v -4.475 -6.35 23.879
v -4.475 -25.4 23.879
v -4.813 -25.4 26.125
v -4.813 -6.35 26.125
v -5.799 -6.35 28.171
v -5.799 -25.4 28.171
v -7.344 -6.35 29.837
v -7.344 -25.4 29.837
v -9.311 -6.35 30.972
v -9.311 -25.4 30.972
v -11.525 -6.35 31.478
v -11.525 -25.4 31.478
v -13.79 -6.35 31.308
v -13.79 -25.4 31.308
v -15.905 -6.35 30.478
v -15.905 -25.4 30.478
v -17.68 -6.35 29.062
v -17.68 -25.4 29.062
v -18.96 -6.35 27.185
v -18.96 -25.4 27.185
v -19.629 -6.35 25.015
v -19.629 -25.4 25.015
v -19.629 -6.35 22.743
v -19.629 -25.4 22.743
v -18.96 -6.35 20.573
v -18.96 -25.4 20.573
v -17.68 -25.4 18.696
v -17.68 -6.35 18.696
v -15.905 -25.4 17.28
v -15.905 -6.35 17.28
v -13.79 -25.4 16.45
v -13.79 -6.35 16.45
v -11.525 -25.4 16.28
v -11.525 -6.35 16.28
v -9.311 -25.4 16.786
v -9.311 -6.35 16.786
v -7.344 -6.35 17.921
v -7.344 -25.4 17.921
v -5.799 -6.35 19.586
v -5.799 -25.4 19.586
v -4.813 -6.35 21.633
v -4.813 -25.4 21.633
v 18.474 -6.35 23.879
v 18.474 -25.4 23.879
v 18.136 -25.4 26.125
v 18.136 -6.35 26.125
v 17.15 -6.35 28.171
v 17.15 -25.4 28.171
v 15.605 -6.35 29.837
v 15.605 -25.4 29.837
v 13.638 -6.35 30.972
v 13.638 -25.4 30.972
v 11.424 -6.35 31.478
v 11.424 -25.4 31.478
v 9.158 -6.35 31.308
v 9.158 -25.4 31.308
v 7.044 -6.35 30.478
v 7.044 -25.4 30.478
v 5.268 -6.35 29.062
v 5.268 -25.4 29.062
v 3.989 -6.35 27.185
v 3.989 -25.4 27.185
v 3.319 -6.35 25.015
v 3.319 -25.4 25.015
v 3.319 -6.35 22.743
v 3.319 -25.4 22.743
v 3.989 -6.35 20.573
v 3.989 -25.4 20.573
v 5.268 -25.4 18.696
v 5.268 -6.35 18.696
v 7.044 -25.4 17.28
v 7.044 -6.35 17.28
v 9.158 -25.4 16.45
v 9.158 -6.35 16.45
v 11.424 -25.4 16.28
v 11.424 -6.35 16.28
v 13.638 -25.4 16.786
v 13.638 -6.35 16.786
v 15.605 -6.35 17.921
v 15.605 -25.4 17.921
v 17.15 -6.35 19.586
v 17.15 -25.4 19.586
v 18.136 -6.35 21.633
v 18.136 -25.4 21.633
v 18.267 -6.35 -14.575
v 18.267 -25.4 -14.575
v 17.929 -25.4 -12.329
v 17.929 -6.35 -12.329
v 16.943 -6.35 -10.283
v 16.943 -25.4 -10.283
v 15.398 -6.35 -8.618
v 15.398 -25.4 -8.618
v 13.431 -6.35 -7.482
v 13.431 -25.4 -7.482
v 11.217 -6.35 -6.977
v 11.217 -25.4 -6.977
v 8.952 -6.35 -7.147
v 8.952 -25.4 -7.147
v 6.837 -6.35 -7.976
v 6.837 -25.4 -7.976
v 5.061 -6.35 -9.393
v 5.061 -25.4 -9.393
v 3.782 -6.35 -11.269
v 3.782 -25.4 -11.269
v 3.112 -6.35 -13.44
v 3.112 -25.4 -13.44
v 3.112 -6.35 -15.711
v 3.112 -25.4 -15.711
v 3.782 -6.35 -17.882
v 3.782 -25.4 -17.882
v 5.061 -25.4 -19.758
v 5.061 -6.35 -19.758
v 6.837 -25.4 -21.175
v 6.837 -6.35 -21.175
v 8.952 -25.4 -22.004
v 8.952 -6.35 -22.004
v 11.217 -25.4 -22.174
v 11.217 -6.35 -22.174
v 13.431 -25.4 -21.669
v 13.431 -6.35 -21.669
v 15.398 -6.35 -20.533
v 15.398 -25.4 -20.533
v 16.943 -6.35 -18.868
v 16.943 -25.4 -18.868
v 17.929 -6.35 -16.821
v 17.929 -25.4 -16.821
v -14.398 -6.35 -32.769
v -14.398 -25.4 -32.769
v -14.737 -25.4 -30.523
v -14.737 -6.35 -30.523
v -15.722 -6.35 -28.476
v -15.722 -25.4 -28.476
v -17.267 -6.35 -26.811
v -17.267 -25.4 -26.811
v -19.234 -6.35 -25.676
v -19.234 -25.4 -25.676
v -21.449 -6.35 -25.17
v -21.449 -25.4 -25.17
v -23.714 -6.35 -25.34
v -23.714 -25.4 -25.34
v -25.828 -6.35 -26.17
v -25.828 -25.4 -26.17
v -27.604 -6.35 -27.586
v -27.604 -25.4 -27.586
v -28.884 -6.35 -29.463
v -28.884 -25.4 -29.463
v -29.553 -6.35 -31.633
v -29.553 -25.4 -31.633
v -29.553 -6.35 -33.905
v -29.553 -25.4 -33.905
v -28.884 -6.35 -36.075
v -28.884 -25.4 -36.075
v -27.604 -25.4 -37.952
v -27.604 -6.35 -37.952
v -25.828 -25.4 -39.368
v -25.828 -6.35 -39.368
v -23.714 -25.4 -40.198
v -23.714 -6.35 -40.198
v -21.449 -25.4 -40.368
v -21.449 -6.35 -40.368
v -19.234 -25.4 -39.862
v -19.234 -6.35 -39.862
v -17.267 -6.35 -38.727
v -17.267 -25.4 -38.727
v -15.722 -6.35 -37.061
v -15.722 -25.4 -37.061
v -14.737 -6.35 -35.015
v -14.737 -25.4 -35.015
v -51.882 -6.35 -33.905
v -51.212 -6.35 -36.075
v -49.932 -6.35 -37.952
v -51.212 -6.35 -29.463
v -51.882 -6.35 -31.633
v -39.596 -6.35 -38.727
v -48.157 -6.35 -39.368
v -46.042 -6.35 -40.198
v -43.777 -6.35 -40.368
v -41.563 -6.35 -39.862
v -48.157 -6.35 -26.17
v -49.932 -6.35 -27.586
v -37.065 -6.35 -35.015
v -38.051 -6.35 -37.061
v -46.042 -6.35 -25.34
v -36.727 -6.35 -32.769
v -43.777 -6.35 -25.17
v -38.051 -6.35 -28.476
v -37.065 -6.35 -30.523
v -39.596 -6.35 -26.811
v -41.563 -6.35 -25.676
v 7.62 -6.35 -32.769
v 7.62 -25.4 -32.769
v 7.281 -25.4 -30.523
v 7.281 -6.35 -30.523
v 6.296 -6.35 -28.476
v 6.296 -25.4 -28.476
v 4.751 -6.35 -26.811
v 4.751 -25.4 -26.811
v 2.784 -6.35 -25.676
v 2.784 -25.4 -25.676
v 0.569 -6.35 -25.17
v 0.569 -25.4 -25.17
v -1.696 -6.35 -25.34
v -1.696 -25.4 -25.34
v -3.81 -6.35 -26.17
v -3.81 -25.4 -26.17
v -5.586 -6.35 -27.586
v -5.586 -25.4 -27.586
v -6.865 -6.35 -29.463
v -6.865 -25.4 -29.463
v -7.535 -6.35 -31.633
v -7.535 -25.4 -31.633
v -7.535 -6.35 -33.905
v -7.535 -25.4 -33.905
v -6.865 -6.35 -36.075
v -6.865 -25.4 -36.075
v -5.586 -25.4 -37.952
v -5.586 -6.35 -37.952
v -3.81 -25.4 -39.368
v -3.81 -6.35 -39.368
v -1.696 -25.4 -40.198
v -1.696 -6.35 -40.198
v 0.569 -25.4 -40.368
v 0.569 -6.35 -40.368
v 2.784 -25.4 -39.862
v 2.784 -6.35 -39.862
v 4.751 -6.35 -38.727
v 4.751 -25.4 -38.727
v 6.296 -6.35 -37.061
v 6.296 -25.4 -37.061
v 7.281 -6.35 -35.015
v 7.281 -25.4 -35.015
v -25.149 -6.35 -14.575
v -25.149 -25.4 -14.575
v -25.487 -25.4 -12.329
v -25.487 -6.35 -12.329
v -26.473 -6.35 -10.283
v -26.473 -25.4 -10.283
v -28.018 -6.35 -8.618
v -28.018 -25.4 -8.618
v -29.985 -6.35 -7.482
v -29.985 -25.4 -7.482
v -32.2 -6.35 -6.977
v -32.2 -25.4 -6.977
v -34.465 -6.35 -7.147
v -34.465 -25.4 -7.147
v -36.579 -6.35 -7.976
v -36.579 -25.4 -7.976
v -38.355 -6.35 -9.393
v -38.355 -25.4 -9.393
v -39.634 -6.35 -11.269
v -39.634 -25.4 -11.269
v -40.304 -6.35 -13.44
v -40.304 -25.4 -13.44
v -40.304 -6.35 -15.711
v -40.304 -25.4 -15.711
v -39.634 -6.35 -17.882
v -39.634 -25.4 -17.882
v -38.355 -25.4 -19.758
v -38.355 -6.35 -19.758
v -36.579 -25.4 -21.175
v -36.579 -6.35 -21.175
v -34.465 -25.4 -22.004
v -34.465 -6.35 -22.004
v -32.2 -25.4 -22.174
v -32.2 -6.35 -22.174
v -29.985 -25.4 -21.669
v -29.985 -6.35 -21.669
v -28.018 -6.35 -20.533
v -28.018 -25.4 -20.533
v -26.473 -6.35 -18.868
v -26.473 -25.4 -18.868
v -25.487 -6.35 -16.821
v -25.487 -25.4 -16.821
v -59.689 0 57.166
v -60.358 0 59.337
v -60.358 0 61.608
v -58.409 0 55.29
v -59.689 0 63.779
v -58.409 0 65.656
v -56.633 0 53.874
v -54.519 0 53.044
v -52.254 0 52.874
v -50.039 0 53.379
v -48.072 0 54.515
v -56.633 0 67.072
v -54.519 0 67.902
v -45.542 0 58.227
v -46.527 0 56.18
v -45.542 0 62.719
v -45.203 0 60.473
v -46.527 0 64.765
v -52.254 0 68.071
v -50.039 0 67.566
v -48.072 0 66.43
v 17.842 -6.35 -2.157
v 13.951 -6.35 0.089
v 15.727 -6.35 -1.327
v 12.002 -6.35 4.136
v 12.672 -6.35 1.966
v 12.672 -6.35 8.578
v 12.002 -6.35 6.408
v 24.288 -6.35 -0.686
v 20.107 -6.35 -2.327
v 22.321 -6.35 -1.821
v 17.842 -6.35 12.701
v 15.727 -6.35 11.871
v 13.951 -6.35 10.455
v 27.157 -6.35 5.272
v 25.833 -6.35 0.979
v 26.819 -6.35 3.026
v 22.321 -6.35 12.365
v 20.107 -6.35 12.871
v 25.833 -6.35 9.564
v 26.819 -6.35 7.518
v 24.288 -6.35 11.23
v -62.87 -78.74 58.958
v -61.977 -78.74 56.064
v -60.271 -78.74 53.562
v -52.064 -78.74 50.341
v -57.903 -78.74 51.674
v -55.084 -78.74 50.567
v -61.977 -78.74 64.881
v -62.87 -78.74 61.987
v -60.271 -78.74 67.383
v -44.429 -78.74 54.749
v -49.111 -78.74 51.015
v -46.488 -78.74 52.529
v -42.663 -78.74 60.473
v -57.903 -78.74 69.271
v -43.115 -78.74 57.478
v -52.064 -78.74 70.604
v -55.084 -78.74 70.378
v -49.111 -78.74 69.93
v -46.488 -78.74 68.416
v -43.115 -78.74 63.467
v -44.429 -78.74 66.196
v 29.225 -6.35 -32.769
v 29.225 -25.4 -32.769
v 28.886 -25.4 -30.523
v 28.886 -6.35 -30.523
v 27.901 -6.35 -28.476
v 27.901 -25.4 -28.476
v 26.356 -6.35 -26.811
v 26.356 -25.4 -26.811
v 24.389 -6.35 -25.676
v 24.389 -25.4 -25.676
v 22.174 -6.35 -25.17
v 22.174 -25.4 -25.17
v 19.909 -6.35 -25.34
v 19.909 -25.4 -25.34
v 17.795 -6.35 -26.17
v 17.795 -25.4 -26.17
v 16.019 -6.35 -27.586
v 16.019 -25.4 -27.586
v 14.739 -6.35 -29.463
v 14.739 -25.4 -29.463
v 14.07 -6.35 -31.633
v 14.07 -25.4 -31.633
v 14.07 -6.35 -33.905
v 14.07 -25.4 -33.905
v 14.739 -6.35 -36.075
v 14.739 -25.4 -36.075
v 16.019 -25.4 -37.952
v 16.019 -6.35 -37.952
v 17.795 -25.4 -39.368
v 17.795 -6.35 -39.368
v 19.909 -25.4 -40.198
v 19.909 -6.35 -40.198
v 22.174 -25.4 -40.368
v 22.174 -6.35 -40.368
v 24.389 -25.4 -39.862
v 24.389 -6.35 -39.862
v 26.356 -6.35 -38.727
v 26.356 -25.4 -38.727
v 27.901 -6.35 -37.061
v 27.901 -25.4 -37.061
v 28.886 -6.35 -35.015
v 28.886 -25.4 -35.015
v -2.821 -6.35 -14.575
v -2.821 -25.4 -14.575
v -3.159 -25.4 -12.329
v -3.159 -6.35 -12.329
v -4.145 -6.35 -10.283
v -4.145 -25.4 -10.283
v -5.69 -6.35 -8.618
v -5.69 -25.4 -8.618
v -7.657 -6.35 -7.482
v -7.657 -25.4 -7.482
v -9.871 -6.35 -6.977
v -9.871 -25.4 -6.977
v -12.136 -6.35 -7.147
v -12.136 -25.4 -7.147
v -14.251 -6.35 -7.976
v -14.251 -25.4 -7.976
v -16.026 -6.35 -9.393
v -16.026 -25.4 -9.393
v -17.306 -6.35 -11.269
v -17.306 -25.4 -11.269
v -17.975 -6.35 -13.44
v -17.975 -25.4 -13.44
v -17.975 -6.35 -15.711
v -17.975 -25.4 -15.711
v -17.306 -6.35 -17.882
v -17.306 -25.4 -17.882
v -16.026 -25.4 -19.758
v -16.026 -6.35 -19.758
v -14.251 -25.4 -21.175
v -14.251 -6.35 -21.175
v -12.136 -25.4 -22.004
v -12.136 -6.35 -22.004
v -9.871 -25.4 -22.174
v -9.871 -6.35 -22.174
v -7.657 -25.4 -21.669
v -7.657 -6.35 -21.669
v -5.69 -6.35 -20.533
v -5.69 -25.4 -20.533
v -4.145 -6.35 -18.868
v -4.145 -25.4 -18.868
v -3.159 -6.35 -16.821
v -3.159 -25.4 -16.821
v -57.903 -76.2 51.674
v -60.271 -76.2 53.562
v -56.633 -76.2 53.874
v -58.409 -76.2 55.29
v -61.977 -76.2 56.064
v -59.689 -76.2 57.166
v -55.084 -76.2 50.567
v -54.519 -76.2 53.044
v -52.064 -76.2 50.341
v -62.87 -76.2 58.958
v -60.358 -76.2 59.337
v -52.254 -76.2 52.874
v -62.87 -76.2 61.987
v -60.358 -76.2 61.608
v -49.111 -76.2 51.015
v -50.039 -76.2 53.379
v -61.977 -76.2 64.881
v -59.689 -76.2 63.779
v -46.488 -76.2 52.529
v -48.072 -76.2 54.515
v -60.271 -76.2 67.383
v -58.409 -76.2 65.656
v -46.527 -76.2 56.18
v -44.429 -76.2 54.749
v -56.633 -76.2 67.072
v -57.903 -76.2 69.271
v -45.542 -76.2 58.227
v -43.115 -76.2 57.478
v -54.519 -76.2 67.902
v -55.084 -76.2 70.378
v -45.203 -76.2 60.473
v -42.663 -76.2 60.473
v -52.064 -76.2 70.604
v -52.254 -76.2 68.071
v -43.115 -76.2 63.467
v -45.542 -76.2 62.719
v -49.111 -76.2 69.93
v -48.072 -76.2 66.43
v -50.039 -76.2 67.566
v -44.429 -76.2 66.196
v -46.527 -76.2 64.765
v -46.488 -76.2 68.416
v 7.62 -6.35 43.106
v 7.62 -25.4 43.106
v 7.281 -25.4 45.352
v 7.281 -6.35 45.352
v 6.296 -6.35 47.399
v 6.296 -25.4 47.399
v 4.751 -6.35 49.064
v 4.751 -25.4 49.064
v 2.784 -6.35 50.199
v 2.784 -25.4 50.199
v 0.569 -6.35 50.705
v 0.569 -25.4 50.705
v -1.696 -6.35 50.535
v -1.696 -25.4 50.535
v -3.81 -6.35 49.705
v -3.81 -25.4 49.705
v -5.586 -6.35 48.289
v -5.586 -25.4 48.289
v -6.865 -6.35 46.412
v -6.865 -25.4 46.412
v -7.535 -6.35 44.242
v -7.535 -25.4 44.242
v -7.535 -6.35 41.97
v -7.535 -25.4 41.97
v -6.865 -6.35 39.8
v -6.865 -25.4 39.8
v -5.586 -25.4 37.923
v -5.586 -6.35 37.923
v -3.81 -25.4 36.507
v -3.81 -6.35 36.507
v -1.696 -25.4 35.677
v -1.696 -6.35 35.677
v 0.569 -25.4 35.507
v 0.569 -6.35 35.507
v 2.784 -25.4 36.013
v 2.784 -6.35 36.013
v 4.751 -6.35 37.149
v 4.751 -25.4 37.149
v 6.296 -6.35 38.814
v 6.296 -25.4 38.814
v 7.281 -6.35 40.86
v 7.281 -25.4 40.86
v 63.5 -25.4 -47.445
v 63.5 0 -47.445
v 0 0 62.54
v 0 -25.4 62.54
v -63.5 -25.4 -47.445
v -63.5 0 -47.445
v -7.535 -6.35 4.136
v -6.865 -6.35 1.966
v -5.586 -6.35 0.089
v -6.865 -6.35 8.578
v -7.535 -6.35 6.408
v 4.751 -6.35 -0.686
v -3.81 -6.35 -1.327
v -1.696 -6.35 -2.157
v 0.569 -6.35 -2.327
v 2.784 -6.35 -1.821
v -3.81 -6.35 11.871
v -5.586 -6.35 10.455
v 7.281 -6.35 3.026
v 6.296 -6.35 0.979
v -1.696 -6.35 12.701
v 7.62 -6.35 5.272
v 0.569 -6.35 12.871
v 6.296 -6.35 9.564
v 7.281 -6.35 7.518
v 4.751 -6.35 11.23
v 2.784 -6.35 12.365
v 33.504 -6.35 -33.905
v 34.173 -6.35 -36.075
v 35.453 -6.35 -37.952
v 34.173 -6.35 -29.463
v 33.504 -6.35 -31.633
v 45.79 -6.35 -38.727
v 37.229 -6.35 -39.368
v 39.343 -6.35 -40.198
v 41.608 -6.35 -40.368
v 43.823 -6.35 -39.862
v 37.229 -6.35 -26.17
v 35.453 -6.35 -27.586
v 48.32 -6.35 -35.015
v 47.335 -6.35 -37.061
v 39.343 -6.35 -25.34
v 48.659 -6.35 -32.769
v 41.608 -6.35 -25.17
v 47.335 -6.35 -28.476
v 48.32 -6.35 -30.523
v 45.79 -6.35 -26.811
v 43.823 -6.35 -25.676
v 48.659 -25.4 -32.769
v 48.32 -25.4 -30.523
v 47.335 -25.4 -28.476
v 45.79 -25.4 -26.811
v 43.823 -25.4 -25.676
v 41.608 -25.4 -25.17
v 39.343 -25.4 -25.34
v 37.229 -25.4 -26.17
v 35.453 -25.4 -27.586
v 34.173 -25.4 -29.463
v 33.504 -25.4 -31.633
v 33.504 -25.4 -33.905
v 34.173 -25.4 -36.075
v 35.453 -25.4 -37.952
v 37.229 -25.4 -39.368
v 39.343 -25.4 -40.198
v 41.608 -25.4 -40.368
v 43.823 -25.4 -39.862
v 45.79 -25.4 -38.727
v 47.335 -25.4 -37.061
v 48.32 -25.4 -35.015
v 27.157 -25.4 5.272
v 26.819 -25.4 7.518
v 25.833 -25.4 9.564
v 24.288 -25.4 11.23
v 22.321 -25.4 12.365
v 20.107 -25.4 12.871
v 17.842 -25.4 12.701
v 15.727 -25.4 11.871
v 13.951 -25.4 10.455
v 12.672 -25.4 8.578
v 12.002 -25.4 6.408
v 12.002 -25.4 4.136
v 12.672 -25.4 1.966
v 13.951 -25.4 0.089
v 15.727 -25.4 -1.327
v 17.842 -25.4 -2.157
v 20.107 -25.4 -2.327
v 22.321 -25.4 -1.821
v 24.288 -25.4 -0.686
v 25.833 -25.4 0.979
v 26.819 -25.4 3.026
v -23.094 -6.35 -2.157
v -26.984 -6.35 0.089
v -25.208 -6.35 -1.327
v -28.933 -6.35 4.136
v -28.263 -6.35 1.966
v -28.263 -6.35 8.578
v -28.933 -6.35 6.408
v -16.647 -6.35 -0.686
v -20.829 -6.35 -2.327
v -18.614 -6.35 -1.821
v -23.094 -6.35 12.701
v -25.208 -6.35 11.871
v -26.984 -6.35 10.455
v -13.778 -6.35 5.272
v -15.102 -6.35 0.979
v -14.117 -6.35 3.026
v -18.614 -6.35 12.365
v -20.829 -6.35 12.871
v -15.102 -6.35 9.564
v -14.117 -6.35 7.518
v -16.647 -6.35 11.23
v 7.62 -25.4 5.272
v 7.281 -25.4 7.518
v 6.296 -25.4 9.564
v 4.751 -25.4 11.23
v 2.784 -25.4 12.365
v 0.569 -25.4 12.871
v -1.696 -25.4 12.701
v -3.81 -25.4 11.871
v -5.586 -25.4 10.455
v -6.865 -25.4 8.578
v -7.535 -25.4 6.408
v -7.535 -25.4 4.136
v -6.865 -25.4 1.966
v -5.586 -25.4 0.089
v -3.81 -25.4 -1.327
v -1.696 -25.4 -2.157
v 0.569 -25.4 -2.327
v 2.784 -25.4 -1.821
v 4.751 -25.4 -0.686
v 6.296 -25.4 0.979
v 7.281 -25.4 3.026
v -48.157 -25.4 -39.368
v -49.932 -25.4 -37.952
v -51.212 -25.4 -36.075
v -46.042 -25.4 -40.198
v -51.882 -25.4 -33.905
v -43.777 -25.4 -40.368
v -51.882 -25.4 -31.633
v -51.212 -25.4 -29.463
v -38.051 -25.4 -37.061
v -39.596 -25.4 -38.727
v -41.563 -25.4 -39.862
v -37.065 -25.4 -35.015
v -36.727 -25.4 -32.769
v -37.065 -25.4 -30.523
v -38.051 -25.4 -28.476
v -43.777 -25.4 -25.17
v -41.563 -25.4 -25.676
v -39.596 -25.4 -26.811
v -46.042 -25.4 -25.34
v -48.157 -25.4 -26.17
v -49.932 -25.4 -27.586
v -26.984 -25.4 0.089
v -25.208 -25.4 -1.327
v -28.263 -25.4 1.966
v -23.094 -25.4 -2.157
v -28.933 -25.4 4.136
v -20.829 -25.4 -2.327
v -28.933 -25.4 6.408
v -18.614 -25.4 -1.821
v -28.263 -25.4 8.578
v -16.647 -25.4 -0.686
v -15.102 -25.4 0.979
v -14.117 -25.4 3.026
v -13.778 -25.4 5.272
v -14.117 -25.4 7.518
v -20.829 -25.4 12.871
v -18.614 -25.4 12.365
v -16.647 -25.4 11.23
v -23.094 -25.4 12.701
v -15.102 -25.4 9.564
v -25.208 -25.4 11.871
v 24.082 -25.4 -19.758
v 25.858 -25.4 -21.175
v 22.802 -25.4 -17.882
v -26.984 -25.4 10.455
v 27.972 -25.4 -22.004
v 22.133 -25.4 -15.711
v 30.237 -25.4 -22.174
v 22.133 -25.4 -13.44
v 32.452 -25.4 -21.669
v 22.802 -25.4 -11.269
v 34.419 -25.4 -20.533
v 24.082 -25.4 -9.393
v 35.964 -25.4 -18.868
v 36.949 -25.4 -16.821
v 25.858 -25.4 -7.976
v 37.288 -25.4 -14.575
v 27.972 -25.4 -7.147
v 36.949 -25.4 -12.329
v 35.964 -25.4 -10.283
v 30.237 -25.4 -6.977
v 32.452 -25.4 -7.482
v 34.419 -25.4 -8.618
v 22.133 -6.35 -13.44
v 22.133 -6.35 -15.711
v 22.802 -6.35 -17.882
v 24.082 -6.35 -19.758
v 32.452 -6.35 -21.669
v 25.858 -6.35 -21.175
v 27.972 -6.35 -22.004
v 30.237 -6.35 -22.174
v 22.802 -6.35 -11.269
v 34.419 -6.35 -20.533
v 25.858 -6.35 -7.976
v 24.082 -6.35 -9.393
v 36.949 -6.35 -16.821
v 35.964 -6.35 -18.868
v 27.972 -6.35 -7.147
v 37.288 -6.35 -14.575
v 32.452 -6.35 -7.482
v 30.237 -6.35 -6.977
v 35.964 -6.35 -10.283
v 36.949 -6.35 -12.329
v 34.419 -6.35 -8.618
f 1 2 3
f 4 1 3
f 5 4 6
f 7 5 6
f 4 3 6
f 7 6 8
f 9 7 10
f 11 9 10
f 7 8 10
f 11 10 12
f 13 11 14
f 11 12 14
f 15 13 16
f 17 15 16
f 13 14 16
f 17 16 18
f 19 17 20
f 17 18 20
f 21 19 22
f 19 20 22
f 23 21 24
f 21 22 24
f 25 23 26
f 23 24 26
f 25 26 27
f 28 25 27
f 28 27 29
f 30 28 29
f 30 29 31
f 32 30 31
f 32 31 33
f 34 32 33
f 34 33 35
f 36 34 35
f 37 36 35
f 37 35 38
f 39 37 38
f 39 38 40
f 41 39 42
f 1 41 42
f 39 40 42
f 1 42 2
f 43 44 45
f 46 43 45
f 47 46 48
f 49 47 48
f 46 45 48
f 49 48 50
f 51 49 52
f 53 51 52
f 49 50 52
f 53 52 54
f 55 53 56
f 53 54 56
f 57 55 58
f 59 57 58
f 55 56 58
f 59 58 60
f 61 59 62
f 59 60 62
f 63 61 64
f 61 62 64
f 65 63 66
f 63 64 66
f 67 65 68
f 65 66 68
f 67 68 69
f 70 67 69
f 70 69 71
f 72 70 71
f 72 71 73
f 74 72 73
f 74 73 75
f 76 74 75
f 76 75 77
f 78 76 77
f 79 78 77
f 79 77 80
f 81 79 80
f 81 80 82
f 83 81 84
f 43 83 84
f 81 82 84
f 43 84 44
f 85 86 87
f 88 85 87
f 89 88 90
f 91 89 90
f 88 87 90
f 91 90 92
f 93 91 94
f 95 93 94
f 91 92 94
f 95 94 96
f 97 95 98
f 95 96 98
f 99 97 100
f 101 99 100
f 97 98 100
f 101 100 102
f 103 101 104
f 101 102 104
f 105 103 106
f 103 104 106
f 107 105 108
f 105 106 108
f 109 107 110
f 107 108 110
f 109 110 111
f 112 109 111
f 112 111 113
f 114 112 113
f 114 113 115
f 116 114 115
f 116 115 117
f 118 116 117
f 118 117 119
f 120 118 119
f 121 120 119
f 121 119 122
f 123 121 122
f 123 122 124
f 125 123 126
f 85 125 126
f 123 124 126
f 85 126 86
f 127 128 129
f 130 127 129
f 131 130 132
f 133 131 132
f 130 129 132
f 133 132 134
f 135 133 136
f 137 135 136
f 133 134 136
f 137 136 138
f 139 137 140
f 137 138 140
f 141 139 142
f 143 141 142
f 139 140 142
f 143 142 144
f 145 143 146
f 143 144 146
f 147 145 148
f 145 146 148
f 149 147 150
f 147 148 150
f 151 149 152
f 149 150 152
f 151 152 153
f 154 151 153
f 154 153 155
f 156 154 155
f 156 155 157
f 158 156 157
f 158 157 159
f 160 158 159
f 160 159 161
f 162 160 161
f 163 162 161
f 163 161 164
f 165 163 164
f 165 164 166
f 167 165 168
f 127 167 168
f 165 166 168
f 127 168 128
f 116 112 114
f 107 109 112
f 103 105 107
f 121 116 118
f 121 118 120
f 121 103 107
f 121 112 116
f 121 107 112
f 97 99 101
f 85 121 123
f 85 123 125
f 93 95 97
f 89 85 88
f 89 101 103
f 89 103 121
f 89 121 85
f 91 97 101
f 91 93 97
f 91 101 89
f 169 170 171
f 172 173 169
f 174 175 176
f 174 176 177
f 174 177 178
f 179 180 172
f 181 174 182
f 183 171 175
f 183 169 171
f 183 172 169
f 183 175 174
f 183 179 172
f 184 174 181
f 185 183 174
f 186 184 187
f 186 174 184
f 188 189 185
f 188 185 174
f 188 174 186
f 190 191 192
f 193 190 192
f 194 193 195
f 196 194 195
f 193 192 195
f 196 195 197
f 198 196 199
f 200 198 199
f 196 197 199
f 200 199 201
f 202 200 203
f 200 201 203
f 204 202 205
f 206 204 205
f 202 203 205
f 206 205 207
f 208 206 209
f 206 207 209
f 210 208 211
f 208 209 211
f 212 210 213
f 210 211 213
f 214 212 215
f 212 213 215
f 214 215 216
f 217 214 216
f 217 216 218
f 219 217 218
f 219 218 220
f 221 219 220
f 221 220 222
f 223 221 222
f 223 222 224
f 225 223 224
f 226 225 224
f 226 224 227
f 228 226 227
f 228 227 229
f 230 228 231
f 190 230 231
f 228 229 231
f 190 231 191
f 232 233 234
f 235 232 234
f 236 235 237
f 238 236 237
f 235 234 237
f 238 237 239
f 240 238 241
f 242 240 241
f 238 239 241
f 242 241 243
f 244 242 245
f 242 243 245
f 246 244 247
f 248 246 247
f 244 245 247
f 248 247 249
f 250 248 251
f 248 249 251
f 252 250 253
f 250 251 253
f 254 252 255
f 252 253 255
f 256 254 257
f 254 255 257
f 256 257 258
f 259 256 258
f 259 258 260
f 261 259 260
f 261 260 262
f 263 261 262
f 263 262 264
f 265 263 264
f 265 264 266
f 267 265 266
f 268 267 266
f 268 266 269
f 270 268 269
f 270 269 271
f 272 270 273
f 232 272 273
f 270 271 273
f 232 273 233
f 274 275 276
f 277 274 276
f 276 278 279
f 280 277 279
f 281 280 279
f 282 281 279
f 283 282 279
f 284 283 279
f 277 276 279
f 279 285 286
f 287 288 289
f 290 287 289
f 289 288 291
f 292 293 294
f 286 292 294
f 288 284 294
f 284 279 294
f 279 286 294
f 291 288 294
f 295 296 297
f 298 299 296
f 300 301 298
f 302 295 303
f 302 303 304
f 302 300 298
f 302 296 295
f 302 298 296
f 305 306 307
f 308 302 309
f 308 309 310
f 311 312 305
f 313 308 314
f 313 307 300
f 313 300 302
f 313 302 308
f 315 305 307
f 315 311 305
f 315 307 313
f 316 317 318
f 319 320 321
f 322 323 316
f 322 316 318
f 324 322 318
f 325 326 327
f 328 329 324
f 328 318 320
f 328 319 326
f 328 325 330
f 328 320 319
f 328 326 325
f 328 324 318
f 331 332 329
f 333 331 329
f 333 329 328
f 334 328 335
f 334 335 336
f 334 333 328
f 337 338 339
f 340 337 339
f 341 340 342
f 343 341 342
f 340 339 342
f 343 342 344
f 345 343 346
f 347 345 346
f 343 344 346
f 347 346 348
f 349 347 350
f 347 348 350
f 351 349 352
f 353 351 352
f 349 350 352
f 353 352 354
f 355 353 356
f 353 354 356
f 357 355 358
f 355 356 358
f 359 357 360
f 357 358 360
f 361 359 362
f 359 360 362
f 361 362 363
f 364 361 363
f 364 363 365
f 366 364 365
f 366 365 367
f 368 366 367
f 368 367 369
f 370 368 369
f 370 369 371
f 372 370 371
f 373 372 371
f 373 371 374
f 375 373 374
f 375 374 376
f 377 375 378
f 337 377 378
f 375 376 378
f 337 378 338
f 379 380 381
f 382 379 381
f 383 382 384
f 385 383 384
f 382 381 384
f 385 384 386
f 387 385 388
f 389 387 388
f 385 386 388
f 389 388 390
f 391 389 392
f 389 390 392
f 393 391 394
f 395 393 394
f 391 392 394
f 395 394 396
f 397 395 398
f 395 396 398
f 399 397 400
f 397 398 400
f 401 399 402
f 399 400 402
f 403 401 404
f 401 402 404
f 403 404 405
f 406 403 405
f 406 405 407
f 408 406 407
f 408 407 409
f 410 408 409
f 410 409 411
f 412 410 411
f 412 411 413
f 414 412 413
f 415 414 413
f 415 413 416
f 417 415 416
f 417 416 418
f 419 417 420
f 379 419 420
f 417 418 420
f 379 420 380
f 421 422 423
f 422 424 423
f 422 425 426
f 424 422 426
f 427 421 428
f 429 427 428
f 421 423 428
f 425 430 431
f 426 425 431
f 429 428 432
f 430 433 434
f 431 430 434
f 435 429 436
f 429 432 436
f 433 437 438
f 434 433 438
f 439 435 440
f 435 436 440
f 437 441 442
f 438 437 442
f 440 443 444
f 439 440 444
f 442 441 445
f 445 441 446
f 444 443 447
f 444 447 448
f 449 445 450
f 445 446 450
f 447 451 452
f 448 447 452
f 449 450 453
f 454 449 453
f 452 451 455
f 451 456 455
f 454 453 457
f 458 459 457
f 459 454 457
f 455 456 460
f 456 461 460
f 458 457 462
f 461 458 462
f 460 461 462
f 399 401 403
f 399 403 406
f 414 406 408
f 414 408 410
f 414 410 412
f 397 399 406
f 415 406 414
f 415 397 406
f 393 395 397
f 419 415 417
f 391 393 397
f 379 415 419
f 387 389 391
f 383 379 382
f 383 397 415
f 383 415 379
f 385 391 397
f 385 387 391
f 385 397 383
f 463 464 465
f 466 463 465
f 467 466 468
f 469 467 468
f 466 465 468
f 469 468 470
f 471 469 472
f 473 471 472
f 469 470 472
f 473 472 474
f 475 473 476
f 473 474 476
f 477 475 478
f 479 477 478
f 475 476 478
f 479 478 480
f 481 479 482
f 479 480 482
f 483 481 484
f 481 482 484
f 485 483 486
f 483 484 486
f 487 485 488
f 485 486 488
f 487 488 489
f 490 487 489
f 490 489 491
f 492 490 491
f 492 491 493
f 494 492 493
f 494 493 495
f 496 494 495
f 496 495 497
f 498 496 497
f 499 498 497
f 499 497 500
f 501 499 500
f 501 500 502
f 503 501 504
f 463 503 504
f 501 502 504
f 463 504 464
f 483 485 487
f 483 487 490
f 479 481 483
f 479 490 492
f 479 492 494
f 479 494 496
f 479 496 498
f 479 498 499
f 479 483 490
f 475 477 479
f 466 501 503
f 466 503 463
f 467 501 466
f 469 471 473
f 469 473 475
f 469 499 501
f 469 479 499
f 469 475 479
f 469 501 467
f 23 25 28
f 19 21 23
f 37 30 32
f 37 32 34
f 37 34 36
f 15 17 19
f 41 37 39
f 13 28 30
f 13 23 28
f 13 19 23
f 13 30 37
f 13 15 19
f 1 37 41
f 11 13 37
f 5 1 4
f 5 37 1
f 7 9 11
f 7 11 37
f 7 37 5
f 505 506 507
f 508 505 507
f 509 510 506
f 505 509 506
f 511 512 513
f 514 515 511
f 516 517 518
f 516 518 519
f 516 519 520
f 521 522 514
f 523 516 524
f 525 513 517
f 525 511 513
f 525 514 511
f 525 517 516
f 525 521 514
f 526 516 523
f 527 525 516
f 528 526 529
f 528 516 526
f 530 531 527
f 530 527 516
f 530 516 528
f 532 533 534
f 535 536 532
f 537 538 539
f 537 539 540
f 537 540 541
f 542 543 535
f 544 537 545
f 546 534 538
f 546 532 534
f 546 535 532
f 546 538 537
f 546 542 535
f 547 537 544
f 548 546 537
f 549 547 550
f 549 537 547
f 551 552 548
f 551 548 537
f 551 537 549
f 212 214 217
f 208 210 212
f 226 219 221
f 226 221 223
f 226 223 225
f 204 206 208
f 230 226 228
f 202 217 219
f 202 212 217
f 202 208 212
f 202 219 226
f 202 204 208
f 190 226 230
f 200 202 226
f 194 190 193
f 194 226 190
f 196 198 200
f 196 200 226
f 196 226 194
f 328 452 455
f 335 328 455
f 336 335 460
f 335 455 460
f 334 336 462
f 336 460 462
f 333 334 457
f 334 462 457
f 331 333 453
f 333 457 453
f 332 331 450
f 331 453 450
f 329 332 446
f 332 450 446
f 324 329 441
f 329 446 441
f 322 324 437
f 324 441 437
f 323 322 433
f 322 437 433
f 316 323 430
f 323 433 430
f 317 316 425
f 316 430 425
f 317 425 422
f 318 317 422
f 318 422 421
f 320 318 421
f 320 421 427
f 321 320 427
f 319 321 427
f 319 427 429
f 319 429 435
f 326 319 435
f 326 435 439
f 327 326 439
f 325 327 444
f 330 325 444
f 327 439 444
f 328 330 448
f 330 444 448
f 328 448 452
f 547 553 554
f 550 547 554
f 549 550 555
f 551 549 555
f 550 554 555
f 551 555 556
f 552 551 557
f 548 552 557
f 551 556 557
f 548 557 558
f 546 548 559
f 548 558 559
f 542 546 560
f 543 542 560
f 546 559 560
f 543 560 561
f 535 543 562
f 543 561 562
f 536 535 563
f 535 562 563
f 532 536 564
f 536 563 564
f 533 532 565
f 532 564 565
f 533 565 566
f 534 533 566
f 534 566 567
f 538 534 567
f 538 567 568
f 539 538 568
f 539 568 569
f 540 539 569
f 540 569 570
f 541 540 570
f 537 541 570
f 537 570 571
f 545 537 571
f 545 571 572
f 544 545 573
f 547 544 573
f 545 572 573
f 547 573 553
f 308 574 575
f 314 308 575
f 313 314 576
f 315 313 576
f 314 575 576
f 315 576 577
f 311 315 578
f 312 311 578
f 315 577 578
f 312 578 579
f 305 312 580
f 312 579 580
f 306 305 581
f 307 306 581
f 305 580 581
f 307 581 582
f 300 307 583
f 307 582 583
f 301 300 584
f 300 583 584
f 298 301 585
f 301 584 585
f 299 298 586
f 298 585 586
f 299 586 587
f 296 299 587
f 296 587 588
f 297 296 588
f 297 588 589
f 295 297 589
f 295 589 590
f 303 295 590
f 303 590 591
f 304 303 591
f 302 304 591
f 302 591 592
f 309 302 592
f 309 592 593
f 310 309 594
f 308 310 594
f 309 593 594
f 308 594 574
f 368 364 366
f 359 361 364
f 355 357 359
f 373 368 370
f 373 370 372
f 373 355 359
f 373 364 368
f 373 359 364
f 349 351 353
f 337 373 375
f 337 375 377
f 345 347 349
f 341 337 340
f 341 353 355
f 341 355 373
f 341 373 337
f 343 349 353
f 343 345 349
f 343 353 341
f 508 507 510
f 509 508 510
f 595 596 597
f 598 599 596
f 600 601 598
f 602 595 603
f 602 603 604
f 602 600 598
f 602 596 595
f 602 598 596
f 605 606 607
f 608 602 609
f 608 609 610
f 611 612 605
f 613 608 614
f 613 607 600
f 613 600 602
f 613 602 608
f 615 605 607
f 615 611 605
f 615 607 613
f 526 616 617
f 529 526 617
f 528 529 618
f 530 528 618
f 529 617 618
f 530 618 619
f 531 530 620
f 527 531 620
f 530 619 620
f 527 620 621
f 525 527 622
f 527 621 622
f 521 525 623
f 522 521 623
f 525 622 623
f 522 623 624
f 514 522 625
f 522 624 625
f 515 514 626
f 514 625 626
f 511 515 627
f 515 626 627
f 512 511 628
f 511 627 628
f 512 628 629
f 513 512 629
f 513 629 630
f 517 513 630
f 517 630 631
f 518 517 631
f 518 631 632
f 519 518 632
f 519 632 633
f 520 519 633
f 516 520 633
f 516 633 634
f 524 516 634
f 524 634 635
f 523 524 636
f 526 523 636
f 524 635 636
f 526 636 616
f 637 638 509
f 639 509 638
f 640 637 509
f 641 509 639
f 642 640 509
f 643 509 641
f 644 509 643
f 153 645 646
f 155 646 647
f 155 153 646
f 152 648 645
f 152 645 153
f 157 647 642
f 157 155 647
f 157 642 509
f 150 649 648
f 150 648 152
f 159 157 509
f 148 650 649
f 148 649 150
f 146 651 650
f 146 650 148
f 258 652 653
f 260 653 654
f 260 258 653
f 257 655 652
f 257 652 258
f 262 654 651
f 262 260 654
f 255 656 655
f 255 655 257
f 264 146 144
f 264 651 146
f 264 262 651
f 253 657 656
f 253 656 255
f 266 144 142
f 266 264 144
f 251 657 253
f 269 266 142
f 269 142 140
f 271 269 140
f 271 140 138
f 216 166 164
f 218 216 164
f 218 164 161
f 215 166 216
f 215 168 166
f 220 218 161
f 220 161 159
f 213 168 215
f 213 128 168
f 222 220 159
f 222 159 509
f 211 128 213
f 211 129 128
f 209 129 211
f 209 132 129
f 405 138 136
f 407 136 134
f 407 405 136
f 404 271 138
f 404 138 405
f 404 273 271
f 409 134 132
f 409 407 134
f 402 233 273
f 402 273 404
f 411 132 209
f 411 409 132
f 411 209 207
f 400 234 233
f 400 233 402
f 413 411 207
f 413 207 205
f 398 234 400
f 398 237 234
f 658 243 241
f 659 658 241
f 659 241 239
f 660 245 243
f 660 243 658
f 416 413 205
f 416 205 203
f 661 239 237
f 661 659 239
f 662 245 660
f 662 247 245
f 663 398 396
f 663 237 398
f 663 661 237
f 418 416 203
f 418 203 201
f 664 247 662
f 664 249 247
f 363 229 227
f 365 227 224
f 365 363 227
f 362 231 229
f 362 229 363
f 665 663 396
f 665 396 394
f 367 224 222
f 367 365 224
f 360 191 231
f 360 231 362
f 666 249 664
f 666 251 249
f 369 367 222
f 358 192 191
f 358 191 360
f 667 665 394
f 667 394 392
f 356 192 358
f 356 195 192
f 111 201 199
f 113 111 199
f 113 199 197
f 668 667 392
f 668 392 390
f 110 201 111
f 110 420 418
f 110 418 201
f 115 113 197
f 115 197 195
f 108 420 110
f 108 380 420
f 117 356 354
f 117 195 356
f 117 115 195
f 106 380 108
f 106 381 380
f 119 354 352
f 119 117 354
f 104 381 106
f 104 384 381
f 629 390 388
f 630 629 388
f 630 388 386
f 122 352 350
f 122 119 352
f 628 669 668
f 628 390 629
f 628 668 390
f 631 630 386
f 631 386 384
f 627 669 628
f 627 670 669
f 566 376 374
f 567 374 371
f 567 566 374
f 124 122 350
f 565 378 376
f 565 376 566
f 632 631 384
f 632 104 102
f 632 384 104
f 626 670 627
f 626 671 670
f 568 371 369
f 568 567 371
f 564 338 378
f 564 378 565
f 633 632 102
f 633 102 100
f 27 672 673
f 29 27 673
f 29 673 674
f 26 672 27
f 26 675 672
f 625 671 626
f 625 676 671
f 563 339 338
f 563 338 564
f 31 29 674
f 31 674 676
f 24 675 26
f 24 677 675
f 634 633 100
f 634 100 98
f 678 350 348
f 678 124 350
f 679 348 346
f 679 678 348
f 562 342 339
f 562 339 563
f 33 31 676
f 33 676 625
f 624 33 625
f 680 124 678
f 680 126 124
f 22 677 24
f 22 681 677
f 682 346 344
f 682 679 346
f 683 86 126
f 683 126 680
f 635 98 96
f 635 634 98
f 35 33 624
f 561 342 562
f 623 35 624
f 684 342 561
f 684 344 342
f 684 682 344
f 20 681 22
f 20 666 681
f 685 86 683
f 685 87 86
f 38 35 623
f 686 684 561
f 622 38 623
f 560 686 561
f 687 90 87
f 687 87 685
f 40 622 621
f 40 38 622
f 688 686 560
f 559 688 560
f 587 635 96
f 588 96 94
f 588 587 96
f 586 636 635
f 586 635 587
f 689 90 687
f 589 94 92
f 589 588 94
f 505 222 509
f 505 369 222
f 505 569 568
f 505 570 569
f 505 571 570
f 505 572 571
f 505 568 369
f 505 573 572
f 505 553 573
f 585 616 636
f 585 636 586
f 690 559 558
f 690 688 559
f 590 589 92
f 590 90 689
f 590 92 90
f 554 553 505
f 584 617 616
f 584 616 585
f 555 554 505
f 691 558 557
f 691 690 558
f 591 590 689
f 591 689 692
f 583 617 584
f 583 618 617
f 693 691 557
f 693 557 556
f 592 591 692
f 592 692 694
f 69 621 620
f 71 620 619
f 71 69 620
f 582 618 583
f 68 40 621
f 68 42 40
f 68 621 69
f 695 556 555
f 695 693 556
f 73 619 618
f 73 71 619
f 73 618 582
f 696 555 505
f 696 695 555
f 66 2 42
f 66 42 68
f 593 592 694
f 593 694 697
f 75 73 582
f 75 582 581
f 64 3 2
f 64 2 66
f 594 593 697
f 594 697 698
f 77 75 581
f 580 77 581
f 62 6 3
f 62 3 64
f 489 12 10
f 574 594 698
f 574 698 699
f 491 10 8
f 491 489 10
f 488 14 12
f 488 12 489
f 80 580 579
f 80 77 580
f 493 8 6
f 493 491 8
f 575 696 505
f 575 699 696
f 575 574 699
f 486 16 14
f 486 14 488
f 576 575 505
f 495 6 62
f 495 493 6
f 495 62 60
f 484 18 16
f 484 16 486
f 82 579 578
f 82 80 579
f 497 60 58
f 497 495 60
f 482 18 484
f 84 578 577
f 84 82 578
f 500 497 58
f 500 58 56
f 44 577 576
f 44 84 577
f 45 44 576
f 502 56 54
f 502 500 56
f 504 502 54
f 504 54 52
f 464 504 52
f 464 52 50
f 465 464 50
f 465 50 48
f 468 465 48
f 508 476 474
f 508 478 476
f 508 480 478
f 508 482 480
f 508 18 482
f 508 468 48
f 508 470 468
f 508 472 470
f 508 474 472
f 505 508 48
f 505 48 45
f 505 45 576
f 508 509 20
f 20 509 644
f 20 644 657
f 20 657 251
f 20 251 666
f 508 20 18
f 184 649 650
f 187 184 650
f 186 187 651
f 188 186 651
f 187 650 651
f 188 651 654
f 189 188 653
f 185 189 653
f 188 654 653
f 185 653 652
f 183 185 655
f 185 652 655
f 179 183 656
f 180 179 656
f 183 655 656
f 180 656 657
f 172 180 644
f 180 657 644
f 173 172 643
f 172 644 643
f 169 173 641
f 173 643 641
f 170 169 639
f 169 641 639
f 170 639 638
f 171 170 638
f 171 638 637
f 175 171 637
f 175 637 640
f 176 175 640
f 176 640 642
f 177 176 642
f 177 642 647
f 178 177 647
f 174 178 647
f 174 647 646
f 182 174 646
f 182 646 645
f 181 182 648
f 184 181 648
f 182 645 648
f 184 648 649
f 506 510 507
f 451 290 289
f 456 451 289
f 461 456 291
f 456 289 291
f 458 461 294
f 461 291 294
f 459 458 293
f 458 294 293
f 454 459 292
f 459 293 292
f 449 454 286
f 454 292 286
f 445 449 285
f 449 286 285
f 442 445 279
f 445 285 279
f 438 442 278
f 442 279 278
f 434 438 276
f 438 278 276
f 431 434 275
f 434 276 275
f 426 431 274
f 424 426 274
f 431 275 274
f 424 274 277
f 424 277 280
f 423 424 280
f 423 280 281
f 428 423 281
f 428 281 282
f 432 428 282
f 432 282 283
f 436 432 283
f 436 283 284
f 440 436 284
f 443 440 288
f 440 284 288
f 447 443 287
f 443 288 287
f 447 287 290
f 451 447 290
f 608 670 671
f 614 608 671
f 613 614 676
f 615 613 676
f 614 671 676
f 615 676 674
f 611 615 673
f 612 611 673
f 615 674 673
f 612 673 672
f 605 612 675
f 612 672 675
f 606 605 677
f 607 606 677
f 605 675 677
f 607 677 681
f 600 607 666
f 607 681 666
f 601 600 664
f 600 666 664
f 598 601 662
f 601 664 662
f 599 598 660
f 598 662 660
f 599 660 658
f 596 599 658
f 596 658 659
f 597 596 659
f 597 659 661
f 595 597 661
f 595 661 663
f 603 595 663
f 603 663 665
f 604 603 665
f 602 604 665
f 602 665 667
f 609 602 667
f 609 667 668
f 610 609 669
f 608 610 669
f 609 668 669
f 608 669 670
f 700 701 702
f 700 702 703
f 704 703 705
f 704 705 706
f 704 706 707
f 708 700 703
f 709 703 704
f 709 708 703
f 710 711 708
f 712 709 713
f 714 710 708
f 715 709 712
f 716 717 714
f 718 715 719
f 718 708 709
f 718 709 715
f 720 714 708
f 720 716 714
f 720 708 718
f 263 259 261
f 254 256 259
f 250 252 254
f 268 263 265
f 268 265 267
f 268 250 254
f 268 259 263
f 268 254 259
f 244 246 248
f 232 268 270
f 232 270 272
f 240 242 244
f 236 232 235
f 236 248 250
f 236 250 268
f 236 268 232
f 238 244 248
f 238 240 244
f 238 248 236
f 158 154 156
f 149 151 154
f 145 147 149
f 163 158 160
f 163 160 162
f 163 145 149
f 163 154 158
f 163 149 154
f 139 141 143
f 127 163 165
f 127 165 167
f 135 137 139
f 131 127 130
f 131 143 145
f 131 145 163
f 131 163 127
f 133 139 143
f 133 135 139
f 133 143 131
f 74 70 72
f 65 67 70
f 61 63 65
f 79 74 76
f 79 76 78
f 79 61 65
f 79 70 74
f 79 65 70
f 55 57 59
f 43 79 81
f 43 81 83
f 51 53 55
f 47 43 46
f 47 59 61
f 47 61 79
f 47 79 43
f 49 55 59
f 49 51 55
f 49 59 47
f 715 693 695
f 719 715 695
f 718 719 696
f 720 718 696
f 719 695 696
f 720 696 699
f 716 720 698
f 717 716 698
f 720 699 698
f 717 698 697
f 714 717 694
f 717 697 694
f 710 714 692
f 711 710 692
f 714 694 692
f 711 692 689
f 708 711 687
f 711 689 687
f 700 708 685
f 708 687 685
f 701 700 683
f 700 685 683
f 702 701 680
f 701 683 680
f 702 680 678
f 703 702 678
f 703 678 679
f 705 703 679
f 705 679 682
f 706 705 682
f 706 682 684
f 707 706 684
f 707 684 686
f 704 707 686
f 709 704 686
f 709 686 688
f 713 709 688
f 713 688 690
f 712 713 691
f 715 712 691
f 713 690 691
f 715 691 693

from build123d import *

# Parameters (mm, degrees)
F1_DEPTH = 25.4
F2_R     = 7.62
F3_DEPTH = 19.05
F4_R     = 7.62
F5_DEPTH = 76.2
F6_R     = 7.62
F6_R_2   = 10.16
F7_DEPTH = 2.54


with BuildPart() as f1:
    # F0 (on Front) → F1 (new body)
    with BuildSketch(Plane.XZ):
        Polygon((63.5, -47.445105), (0, 62.540121), (-63.5, -47.445105), align=None)
    extrude(amount=F1_DEPTH)

    # F2 (on face) → F3 (cut)
    with BuildSketch(Plane.XZ.offset(25.4)):
        with Locations((0, 43.106165)):
            Circle(F2_R)
        with Locations((-12.094534, 23.878952)):
            Circle(F2_R)
        with Locations((10.85407, 23.878952)):
            Circle(F2_R)
        with Locations((0, 5.271977)):
            Circle(F2_R)
        with Locations((-21.398023, 5.271977)):
            Circle(F2_R)
        with Locations((19.537326, 5.271977)):
            Circle(F2_R)
        with Locations((-32.768954, -14.575465)):
            Circle(F2_R)
        with Locations((-10.440581, -14.575465)):
            Circle(F2_R)
        with Locations((10.647326, -14.575465)):
            Circle(F2_R)
        with Locations((29.667793, -14.575465)):
            Circle(F2_R)
        with Locations((0, -32.768954)):
            Circle(F2_R)
        with Locations((21.604767, -32.768954)):
            Circle(F2_R)
        with Locations((41.038726, -32.768954)):
            Circle(F2_R)
        with Locations((-22.018256, -32.768954)):
            Circle(F2_R)
        with Locations((-44.346627, -32.768954)):
            Circle(F2_R)
    extrude(amount=-F3_DEPTH, mode=Mode.SUBTRACT)


with BuildPart() as f5:
    # F4 (on Front) → F5 (new body)
    with BuildSketch(Plane.XZ):
        with Locations((-52.823141, 60.472675)):
            Circle(F4_R)
    extrude(amount=F5_DEPTH)

    # F6 (on face) → F7 (join)
    with BuildSketch(Plane.XZ.offset(76.2)):
        with Locations((-52.823141, 60.472675)):
            Circle(F6_R)
        with Locations((-52.823141, 60.472675)):
            Circle(F6_R_2)
    extrude(amount=F7_DEPTH)


solid = Compound([f1.part, f5.part])
